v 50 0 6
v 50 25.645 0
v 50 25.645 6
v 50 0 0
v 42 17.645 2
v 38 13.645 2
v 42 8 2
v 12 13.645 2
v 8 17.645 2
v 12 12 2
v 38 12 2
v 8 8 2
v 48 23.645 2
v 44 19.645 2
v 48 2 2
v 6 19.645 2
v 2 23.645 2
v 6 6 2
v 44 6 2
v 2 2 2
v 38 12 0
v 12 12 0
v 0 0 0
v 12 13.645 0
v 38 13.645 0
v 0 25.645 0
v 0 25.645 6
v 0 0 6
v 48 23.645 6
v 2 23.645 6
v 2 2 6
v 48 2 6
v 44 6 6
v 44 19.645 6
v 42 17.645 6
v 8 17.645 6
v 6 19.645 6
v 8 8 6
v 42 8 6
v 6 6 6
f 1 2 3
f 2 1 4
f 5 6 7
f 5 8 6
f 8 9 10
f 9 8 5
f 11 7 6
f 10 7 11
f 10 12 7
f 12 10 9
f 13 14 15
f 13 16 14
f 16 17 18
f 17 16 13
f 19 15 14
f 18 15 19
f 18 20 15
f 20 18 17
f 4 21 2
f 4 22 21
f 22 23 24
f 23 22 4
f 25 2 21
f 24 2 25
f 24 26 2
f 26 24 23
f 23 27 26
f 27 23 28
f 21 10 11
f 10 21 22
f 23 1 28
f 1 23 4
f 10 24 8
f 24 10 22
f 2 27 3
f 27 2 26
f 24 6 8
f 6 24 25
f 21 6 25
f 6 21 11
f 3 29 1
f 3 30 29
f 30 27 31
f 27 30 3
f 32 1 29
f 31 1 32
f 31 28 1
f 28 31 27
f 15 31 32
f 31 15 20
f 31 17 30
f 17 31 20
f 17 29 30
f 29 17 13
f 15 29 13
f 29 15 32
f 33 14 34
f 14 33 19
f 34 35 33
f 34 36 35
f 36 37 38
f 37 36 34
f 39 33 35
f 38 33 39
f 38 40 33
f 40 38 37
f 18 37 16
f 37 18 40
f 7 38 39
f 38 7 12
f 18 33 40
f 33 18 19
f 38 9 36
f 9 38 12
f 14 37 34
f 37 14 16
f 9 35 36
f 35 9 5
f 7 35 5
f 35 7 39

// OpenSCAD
// Create end caps for smaller boxes that will use cardboard, acrylic or other
// sheet material for the sides. 

//Box Width (mm)
box_width_x = 50;
//Box Depth (mm)
box_depth_y = 25.645;
// Box Height (mm) won't effect end caps but is used to give prefered 
// dimensions for sheet goods (and possible svg output)
box_height_z = 50;
// Thickness of bracket sides (mm)
bracket_thickness = 2;
// Thickness of sheet good slot (mm)
cardboard_thickness = 4;
// Sheet good slot depth (mm)
slotdepth = 4;

//
bot_cube_width = (2 * bracket_thickness) + cardboard_thickness + slotdepth;
bot_cube_len_x = box_width_x;
bot_cube_len_y = box_depth_y;
bot_cube_height = bracket_thickness;

outside_cube_width = bracket_thickness;
outside_cube_len_x = box_width_x;
outside_cube_len_y = box_depth_y;
outside_cube_height = bracket_thickness + slotdepth;

inside_cube_width = bracket_thickness;
inside_cube_len_x = box_width_x - 2 * (bracket_thickness + cardboard_thickness);
inside_cube_len_y = box_depth_y  - 2 * (bracket_thickness + cardboard_thickness);
inside_cube_height = bracket_thickness + slotdepth;

union() {
    // Bottom
    cube([bot_cube_len_x, bot_cube_width, bot_cube_height]);

    rotate(a=90, v=[0,0,1])
    translate([0, -bot_cube_width, 0])
    cube([bot_cube_len_y, bot_cube_width, bot_cube_height]);

    translate([0, box_depth_y - bot_cube_width , 0])
    cube([bot_cube_len_x, bot_cube_width, bot_cube_height]);

    rotate(a=90, v=[0,0,1])
    translate([0, -(bot_cube_len_x), 0])
    cube([bot_cube_len_y, bot_cube_width, bot_cube_height]);

    // Outside
    cube([bot_cube_len_x, outside_cube_width, outside_cube_height]);

    rotate(a=90, v=[0,0,1])
    translate([0, -bracket_thickness, 0])
    cube([bot_cube_len_y, outside_cube_width, outside_cube_height]);

    translate([0, box_depth_y - bracket_thickness , 0])
    cube([bot_cube_len_x, outside_cube_width, outside_cube_height]);

    rotate(a=90, v=[0,0,1])
    translate([0, -(bot_cube_len_x), 0])
    cube([bot_cube_len_y, outside_cube_width, outside_cube_height]);

    // Inside
    translate([cardboard_thickness + bracket_thickness, cardboard_thickness + bracket_thickness, 0])
    cube([inside_cube_len_x, inside_cube_width, inside_cube_height]);

    rotate(a=90, v=[0,0,1])
    translate([cardboard_thickness + bracket_thickness, -(2*bracket_thickness+cardboard_thickness), 0])
    cube([inside_cube_len_y, inside_cube_width, inside_cube_height]);

    translate([cardboard_thickness + bracket_thickness, box_depth_y - (2*bracket_thickness) - cardboard_thickness , 0])
    cube([inside_cube_len_x, inside_cube_width, inside_cube_height]);

    rotate(a=90, v=[0,0,1])
    translate([cardboard_thickness + bracket_thickness, -(bot_cube_len_x-cardboard_thickness-bracket_thickness), 0])
    cube([inside_cube_len_y, inside_cube_width, inside_cube_height]);
}
